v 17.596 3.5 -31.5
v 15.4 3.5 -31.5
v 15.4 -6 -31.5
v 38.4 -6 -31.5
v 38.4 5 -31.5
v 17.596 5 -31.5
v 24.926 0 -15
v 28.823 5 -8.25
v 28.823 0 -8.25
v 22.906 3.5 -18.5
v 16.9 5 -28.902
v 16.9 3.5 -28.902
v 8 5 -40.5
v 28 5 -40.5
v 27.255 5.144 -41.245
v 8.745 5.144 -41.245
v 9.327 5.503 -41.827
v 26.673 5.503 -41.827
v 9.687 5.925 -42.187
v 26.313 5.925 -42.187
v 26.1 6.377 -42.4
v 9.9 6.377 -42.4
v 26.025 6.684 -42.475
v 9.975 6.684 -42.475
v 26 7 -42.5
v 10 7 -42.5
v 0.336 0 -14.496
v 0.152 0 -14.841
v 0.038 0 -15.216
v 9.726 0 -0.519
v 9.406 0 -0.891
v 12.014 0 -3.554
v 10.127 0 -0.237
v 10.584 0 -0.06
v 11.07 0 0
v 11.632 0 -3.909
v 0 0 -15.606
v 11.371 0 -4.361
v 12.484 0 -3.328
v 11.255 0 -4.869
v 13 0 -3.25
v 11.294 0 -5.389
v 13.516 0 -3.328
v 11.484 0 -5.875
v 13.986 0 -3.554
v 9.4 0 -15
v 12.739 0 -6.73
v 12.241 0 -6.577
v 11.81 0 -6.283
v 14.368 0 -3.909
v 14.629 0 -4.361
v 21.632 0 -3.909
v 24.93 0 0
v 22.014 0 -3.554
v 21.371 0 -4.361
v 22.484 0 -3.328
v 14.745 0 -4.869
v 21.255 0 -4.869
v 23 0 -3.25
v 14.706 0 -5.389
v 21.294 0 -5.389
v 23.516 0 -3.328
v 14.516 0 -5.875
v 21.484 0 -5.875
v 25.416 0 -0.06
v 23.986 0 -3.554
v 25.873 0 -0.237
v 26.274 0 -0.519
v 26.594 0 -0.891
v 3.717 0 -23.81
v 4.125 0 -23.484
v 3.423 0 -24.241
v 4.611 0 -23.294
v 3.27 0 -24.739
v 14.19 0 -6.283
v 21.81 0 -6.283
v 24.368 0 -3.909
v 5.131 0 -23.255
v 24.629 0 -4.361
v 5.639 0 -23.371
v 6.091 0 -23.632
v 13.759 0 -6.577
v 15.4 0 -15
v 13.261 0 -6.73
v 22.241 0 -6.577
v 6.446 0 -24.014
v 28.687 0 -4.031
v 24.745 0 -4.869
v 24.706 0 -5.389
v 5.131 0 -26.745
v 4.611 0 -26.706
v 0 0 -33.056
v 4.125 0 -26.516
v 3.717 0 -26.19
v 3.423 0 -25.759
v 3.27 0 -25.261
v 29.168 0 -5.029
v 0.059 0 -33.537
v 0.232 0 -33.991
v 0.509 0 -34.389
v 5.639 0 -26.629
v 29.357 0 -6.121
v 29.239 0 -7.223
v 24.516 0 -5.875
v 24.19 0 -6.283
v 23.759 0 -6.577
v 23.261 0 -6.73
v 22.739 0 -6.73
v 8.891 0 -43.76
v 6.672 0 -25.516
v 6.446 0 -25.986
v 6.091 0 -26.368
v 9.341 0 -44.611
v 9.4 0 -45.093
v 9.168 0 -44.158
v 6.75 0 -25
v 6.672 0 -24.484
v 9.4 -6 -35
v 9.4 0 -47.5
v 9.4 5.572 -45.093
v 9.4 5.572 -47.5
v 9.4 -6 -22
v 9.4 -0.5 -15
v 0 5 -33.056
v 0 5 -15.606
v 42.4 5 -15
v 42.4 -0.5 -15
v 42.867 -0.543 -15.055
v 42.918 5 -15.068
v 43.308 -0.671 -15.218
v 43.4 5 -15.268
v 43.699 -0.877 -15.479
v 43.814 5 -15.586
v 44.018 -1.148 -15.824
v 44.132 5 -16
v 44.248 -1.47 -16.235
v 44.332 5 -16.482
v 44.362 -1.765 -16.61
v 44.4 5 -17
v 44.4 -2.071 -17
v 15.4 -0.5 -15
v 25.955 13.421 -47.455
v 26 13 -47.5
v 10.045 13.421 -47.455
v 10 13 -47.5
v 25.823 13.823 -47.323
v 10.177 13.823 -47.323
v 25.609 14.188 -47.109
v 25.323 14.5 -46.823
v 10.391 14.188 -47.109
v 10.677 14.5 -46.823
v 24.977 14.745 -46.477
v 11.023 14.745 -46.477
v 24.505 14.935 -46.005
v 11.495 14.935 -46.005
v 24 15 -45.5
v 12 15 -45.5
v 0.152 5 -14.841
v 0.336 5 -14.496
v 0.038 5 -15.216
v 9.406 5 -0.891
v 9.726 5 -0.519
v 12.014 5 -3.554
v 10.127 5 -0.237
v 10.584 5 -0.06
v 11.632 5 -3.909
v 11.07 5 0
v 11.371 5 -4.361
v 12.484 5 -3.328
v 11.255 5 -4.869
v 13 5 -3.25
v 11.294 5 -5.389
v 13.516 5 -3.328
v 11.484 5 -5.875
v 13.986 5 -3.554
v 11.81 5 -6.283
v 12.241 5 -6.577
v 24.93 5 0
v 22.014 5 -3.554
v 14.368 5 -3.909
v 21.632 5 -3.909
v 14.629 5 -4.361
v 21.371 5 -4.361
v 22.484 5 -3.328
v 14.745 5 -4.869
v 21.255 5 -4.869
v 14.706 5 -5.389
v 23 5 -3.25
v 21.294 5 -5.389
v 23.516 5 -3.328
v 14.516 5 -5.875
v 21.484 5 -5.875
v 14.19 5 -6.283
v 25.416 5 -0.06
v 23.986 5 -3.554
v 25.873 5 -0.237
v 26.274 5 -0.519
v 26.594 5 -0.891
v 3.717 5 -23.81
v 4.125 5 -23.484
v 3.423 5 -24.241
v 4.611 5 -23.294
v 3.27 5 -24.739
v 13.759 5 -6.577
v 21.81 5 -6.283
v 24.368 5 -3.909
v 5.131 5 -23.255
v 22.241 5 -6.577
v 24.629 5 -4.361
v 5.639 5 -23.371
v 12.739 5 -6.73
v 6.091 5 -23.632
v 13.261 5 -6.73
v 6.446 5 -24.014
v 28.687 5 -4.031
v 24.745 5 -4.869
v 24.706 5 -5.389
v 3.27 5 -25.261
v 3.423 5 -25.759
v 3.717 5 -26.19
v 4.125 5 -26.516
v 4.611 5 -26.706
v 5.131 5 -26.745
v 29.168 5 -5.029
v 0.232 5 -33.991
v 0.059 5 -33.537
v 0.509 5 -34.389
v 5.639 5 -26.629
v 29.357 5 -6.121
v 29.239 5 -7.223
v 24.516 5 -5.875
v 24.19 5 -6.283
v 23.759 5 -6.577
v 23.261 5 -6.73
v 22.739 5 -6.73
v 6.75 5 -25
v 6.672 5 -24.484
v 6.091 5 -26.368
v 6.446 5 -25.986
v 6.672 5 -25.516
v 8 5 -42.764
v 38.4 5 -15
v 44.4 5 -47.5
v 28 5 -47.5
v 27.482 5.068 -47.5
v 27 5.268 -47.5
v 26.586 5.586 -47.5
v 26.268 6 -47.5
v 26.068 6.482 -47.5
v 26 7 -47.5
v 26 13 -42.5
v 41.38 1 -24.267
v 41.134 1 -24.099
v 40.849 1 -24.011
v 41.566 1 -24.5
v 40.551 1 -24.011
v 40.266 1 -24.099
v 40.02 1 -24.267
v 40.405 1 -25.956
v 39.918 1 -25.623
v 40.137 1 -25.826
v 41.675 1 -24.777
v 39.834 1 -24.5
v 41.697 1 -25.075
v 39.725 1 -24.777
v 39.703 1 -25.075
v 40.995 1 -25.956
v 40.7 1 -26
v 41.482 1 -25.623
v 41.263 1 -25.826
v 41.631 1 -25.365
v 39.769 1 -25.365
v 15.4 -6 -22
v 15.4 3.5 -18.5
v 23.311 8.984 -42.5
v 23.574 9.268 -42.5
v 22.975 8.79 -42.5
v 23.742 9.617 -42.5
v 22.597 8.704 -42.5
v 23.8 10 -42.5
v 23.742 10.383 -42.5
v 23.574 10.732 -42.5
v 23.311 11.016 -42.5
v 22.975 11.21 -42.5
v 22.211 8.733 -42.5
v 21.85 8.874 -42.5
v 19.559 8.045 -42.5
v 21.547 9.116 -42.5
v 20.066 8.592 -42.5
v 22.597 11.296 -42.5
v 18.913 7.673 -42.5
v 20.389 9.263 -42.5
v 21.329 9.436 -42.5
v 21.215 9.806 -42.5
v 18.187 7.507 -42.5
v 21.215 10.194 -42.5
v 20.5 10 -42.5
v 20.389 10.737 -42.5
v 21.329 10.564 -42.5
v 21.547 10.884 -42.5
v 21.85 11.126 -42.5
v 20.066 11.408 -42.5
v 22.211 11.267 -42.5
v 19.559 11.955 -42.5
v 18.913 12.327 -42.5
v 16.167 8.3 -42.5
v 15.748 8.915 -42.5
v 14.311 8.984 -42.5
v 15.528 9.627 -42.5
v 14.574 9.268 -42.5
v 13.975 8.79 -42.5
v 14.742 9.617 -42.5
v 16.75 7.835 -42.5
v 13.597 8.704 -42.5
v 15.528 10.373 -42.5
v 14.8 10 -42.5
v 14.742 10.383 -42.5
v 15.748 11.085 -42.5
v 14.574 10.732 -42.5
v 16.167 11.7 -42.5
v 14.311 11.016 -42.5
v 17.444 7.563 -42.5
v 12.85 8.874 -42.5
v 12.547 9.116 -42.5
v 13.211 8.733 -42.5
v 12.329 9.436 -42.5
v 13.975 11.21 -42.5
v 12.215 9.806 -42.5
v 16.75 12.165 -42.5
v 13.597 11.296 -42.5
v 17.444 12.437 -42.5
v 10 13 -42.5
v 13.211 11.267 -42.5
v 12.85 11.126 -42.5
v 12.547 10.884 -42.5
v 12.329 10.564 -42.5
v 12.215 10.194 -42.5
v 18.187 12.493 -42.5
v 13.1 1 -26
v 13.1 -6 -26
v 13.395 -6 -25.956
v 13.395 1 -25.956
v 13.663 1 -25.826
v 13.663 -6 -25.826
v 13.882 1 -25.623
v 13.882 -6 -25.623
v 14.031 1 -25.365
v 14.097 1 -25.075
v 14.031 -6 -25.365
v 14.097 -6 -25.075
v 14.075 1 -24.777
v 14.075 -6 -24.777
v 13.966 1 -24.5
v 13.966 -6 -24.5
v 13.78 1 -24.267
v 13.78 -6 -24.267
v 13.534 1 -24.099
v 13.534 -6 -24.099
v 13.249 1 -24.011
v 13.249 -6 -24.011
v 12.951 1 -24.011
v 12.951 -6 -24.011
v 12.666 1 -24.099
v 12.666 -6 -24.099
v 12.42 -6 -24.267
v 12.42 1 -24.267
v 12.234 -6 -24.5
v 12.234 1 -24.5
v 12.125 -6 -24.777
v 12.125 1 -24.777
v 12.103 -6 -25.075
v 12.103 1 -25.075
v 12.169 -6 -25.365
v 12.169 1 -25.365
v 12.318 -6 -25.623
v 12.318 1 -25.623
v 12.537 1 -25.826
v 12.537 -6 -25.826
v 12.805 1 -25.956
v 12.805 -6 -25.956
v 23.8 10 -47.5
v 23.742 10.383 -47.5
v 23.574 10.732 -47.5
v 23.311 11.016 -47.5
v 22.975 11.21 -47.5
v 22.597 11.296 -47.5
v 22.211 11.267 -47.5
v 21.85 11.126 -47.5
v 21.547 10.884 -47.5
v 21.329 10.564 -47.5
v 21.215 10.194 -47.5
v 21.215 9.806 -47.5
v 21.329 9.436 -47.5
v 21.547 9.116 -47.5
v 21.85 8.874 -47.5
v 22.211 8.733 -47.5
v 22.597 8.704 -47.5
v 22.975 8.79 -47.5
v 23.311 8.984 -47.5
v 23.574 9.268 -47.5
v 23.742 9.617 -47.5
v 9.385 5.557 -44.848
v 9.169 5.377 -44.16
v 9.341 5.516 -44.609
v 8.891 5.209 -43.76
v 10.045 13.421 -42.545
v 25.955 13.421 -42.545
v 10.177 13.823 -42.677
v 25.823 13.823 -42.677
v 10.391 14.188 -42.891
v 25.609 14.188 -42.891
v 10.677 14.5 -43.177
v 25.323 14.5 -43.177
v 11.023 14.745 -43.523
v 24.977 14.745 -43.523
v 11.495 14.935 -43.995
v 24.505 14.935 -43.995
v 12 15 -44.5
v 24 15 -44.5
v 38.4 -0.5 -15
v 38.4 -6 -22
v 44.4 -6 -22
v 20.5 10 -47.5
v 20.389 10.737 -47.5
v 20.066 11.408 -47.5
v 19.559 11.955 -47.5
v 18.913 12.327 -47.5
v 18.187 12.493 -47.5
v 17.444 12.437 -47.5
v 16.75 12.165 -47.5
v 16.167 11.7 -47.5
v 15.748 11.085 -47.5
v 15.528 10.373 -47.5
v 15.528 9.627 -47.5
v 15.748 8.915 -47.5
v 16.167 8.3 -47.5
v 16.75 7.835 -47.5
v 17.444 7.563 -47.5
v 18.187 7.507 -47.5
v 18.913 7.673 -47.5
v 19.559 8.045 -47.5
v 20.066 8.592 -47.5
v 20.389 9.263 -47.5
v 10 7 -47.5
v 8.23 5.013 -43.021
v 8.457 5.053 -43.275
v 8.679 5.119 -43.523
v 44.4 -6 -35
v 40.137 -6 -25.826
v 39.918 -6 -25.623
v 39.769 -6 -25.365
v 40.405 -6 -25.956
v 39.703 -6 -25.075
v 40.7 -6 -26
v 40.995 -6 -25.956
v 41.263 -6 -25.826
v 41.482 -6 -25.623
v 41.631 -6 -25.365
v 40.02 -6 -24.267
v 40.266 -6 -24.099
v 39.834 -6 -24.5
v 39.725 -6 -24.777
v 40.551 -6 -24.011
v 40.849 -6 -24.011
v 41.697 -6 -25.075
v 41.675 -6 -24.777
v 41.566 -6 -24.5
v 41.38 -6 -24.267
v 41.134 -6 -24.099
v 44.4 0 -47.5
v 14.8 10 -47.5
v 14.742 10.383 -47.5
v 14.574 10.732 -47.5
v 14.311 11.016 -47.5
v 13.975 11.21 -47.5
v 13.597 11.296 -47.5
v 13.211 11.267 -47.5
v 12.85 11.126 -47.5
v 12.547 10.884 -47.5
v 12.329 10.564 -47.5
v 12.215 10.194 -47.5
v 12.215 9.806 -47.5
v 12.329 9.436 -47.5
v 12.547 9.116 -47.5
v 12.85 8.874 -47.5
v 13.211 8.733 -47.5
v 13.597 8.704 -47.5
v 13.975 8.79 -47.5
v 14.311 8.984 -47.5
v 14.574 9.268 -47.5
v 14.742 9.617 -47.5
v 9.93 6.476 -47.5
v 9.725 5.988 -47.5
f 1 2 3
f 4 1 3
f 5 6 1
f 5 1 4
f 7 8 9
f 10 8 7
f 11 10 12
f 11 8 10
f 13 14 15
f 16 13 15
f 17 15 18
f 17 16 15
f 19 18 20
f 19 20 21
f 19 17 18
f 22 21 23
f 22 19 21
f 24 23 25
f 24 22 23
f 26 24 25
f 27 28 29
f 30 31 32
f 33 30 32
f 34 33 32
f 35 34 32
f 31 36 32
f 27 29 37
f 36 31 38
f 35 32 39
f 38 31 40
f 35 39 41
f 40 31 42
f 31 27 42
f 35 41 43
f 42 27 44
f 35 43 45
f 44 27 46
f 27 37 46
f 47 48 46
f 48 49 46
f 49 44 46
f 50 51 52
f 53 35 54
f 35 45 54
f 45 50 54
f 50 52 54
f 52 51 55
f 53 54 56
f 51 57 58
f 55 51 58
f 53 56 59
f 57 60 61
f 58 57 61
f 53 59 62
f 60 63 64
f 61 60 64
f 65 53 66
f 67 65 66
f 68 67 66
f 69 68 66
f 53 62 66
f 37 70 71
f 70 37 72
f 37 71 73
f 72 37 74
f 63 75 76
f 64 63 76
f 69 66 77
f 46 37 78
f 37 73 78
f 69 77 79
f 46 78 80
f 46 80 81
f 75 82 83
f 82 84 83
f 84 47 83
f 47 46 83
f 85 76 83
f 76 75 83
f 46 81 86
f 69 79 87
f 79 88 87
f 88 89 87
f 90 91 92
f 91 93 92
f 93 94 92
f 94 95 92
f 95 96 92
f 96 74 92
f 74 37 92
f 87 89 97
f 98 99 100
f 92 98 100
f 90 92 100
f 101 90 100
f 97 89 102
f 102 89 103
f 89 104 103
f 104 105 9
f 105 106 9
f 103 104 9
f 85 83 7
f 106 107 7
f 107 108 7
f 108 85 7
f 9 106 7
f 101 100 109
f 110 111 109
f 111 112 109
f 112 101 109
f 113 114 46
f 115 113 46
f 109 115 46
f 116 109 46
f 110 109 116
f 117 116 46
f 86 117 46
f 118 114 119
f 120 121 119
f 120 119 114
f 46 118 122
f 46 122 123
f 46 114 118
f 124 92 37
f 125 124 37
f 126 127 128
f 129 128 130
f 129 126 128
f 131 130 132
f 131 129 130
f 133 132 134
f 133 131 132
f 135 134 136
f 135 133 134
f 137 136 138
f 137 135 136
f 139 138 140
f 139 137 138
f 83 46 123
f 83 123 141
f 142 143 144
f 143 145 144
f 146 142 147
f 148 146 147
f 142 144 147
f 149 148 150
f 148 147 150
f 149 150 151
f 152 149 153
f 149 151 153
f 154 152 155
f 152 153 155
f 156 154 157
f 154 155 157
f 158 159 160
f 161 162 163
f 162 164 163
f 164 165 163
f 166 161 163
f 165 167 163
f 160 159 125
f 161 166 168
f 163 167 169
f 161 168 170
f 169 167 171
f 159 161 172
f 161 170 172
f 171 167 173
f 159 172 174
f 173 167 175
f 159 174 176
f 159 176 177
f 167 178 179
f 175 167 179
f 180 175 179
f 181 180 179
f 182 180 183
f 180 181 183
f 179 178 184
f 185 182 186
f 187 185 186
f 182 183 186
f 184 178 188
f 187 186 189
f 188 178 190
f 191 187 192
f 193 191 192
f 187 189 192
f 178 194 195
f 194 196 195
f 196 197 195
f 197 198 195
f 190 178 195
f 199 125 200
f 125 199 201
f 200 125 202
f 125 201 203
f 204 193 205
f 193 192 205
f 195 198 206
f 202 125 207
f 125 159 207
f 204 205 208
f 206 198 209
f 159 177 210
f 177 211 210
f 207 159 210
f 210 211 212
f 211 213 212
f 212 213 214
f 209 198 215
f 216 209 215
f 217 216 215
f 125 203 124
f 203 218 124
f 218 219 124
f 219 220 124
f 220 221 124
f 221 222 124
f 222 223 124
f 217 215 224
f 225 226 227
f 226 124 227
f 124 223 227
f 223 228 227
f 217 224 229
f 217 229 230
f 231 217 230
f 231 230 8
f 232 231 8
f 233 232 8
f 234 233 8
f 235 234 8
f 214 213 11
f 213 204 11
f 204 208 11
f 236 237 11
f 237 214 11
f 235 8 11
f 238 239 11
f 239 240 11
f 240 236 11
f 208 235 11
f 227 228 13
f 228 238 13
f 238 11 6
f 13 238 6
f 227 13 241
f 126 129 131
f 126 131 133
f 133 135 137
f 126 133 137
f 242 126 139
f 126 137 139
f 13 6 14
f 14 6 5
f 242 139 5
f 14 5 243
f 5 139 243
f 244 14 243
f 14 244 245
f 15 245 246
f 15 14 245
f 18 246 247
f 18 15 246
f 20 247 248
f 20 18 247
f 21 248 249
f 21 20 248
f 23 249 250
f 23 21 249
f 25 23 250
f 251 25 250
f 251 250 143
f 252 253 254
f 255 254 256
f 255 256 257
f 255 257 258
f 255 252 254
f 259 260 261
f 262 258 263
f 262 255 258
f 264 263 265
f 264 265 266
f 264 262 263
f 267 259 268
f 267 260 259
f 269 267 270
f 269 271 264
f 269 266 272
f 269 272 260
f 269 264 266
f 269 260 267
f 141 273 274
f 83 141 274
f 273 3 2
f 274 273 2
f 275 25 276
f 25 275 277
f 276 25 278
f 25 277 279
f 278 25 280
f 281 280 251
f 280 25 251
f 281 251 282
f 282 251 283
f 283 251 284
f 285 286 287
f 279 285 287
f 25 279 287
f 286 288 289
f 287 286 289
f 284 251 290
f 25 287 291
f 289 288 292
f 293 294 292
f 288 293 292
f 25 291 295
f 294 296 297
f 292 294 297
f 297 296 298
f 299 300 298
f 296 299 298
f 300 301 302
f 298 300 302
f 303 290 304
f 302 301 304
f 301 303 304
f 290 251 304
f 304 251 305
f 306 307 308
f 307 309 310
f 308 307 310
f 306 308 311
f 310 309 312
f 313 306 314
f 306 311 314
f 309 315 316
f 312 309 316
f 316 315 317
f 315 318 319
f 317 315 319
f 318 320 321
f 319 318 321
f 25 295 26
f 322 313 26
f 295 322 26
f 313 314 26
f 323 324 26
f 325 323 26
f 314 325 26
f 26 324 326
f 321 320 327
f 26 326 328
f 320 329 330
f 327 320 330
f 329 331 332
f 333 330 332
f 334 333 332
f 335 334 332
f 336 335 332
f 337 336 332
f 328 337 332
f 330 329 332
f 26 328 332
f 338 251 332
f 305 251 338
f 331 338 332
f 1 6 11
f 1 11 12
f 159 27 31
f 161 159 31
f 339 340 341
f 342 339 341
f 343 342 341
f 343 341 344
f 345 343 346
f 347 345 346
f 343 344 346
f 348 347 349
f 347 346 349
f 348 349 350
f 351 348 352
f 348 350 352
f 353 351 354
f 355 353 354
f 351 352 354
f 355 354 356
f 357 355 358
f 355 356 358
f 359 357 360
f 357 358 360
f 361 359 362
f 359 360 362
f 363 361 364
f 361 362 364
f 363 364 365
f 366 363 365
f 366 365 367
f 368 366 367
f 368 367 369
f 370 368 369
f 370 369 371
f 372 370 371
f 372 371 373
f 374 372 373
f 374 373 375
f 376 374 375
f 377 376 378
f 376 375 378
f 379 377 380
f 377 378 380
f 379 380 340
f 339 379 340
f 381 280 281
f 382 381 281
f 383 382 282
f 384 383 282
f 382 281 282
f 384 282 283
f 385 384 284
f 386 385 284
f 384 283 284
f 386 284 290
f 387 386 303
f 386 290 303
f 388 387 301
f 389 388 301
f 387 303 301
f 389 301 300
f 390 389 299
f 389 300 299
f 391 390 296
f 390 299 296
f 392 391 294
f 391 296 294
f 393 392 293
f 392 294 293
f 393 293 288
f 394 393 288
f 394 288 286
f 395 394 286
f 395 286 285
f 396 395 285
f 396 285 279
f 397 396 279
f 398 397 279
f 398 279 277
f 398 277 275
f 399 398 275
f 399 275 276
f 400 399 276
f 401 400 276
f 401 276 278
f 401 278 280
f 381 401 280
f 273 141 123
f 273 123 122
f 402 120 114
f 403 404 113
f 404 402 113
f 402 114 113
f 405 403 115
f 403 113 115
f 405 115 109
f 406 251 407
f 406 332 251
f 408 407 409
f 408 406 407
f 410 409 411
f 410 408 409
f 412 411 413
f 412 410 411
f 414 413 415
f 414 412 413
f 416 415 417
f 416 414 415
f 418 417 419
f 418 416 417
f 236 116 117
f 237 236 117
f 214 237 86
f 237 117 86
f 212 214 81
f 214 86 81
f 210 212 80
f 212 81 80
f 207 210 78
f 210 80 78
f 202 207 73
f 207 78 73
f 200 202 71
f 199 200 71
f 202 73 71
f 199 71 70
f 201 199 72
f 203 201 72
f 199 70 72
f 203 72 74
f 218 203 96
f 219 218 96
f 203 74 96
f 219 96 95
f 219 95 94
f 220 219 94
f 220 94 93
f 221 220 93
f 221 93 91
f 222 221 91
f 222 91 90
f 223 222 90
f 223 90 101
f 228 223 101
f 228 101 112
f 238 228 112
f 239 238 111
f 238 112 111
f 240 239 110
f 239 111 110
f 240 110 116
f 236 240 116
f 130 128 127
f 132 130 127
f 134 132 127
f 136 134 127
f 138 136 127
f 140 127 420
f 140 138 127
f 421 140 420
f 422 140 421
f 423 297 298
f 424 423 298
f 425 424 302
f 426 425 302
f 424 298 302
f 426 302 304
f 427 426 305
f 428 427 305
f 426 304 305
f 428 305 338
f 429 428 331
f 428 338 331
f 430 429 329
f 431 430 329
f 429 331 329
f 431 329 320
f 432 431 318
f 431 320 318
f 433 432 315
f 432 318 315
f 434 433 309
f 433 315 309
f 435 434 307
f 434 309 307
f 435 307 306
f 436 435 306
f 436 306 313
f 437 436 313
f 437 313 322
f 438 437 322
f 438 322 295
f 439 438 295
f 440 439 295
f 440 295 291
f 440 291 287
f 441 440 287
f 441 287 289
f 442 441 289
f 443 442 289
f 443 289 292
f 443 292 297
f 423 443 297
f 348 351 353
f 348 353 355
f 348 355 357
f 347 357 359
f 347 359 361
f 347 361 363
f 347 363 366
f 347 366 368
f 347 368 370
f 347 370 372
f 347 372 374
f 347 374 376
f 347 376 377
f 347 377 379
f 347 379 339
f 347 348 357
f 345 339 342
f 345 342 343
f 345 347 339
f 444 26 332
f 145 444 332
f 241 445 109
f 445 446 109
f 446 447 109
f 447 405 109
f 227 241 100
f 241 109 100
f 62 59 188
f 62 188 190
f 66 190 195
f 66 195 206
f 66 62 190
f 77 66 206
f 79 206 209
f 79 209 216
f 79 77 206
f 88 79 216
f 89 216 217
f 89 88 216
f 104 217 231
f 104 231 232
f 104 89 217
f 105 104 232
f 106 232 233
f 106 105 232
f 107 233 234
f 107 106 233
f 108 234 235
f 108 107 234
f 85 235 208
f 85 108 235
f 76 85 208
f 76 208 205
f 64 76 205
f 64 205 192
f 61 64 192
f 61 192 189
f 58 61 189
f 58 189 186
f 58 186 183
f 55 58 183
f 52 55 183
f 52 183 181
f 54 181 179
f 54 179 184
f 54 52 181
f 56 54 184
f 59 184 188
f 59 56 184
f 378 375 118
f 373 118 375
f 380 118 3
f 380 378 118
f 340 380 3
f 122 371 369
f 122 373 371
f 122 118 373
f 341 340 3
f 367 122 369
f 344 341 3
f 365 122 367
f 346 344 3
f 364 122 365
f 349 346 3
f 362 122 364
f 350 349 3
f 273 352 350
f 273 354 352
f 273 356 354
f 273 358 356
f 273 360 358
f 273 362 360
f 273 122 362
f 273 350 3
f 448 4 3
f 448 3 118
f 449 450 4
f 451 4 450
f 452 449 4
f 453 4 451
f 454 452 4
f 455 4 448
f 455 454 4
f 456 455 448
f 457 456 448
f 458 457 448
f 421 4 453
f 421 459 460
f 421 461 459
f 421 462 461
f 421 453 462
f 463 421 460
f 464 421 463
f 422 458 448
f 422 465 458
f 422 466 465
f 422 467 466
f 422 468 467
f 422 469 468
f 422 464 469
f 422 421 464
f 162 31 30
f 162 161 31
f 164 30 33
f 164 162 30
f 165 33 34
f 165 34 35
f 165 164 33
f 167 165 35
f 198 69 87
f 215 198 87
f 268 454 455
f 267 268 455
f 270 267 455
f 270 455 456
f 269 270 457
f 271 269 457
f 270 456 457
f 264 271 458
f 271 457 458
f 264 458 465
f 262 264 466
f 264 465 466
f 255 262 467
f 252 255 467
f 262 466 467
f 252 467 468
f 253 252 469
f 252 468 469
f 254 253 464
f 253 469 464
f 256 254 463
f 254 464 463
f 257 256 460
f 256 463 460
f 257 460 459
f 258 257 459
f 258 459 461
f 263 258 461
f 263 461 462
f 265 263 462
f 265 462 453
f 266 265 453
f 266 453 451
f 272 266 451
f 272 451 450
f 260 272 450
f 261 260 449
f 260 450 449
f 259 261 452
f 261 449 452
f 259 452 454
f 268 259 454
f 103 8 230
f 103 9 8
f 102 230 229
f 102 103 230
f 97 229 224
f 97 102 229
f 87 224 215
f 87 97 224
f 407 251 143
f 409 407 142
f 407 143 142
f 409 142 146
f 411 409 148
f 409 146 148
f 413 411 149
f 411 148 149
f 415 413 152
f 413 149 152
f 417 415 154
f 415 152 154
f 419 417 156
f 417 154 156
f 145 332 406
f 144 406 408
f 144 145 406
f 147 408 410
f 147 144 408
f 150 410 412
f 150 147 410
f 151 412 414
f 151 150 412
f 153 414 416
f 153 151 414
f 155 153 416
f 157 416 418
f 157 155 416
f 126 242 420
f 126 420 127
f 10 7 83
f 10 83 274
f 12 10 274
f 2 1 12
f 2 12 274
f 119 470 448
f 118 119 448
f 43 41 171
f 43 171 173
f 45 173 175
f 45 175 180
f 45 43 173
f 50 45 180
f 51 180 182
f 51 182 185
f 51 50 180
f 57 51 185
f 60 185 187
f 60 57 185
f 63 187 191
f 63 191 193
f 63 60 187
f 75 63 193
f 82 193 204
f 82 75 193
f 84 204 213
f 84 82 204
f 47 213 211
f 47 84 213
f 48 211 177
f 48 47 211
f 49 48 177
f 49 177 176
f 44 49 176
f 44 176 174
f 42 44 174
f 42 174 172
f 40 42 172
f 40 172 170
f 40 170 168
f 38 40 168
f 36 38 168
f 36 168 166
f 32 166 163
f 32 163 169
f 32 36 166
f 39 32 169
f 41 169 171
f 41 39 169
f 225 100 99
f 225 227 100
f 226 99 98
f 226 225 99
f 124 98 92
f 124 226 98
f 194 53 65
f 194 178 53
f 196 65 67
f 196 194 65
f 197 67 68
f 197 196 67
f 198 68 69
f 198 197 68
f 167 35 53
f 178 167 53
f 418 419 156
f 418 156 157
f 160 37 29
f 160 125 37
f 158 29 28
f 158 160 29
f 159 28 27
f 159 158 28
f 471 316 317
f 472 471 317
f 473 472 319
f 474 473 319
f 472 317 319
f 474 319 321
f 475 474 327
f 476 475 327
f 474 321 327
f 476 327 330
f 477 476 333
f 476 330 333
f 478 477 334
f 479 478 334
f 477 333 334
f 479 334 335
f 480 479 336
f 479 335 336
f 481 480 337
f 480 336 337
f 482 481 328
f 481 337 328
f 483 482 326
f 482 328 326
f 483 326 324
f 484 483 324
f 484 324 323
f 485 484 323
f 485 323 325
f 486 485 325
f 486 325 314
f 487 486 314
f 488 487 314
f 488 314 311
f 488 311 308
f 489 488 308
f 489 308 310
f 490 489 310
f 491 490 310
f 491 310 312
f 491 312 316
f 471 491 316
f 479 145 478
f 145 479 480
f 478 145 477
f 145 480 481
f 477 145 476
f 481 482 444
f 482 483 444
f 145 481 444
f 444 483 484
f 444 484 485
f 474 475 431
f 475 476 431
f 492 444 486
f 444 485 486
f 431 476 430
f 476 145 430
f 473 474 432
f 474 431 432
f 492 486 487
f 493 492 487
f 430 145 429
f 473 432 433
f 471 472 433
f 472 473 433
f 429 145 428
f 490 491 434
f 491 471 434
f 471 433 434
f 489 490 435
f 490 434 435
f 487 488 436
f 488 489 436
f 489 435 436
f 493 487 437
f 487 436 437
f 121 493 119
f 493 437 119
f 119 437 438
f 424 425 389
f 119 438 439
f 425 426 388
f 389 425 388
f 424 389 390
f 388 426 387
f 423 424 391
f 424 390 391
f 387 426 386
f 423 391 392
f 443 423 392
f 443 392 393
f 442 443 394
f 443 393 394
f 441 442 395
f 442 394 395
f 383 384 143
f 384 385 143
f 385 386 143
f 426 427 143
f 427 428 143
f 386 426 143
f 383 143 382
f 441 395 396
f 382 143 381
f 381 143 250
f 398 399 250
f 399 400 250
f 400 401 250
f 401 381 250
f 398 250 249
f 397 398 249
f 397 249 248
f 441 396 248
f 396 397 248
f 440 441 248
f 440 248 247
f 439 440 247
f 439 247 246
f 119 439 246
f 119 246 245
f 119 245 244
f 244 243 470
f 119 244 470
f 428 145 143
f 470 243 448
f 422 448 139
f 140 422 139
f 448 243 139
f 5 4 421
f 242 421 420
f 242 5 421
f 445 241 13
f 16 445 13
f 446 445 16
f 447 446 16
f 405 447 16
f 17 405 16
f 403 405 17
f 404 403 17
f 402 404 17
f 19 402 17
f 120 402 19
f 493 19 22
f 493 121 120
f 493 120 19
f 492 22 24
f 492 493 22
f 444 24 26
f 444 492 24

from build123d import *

# Parameters (mm, degrees)
SKETCH1_R                = 1.75
SKETCH1_W                = 7.2
SKETCH1_H                = 5.4
BOSS_EXTRUDE1_DEPTH      = 5
FILLET5_RADIUS           = 10
FILLET5_LENGTH           = 5
FILLET2_R                = 5.4
FILLET6_R                = 5.4
SKETCH3_W                = 35
SKETCH3_H                = 20
SKETCH3_W_2              = 23
SKETCH3_H_2              = 13
BOSS_EXTRUDE4_DEPTH      = 6
SKETCH5_W                = 23
SKETCH5_H                = 13
CUT_EXTRUDE1_DEPTH       = 3.5
CUT_EXTRUDE2_DEPTH       = 76.239617224
SKETCH9_R                = 1
CUT_EXTRUDE4_DEPTH       = 7
BOSS_EXTRUDE5_DEPTH      = 2.5
BOSS_EXTRUDE5_DEPTH_BACK = 2.5
SKETCH10_W               = 16
SKETCH10_H               = 15
SKETCH11_R               = 2.5
SKETCH11_R_2             = 1.3
CUT_EXTRUDE5_DEPTH       = 64.2661837
FILLET8_R                = 2
BOSS_EXTRUDE10_DEPTH     = 35
SKETCH13_W               = 23
SKETCH13_H               = 9.5
CUT_EXTRUDE6_DEPTH       = 3.5
CUT_EXTRUDE7_REACH       = 68.728
BOSS_EXTRUDE11_DEPTH     = 20.6
FILLET9_R                = 2
FILLET10_R               = 2
CUT_EXTRUDE9_DEPTH       = 67.029236021
CUT_EXTRUDE9_DEPTH_BACK  = 67.029236021
FILLET11_R               = 4
CHAMFER1_SIZE            = 3
CHAMFER1_SIZE2           = 2.196152423


# Read off the part's stored shape, not the designer's step: Boss-Extrude11
with BuildPart() as part:
    # Sketch1 → Boss-Extrude1 (new body)
    # profile 1 of 4: a face of its own
    with BuildSketch(Plane(origin=(0, 0, 0), x_dir=(1, 0, 0), z_dir=(0, 1, 0))):
        with BuildLine():
            Line((3.25, 25), (0, 25))
            Line((0, 25), (0, 15))
            Line((0, 15), (10, 0))
            Line((10, 0), (26, 0))
            Line((26, 0), (36, 15))
            Line((36, 15), (60, 15))
            Line((60, 15), (60, 25))
            Line((60, 25), (44.5, 25))
            Line((44.5, 25), (44.5, 19.6))
            Line((44.5, 19.6), (37.3, 19.6))
            Line((37.3, 19.6), (26.5, 19.6))
            Line((26.5, 19.6), (26.5, 25))
            Line((26.5, 25), (6.75, 25))
            ThreePointArc((6.75, 25), (5, 23.25), (3.25, 25))
        make_face()
        with Locations(Location((13, 5, 0), (0, 0, 270))):
            Circle(SKETCH1_R, mode=Mode.SUBTRACT)
        with Locations(Location((23, 5, 0), (0, 0, 270))):
            Circle(SKETCH1_R, mode=Mode.SUBTRACT)
    # profile 2 of 4: a face of its own
    with BuildSketch(Plane(origin=(0, 0, 0), x_dir=(1, 0, 0), z_dir=(0, 1, 0))):
        with BuildLine():
            Line((10, 45), (0, 33.819660113))
            Line((0, 33.819660113), (0, 25))
            Line((0, 25), (3.25, 25))
            ThreePointArc((3.25, 25), (5, 26.75), (6.75, 25))
            Line((6.75, 25), (26.5, 25))
            Line((26.5, 25), (26.5, 30.4))
            Line((26.5, 30.4), (37.3, 30.4))
            Line((37.3, 30.4), (44.5, 30.4))
            Line((44.5, 30.4), (44.5, 25))
            Line((44.5, 25), (60, 25))
            Line((60, 25), (60, 35))
            Line((60, 35), (36, 35))
            Line((36, 35), (26, 45))
            Line((26, 45), (10, 45))
        make_face()
    # profile 3 of 4: a face of its own
    with BuildSketch(Plane(origin=(0, 0, 0), x_dir=(1, 0, 0), z_dir=(0, 1, 0))):
        with Locations((40.9, 27.7)):
            Rectangle(SKETCH1_W, SKETCH1_H)
    # profile 4 of 4: a face of its own
    with BuildSketch(Plane(origin=(0, 0, 0), x_dir=(1, 0, 0), z_dir=(0, 1, 0))):
        with Locations((40.9, 22.3)):
            Rectangle(SKETCH1_W, SKETCH1_H)
    extrude(amount=BOSS_EXTRUDE1_DEPTH)

    # Fillet5: full round fillet: the end face becomes a half cylinder, R = half its width
    fillet5_face = Plane((60, 2.5, -25), x_dir=(0, -1, 0), z_dir=(1, 0, 0))  # on the end face: x along it, z out of the body
    fillet5_slab = fillet5_face.offset(-FILLET5_RADIUS / 2) * Box(FILLET5_LENGTH, 2 * FILLET5_RADIUS, FILLET5_RADIUS, mode=Mode.PRIVATE)  # the body's end, R deep
    fillet5_round = Plane((50, 2.5, -25), x_dir=(1, 0, 0), z_dir=(0, -1, 0)) * Cylinder(FILLET5_RADIUS, FILLET5_LENGTH, mode=Mode.PRIVATE)  # its axis R under the face
    add(fillet5_slab - fillet5_round, mode=Mode.SUBTRACT)

    # Fillet2
    fillet2_edges = [part.edges().sort_by_distance(p)[0] for p in [
        (26.5, 2.5, -30.4),
        (26.5, 2.5, -19.6),
    ]]
    fillet(fillet2_edges, radius=FILLET2_R - 0.0001)  # a hair under: the kernel refuses the full size

    # Fillet6
    fillet6_edges = [part.edges().sort_by_distance(p)[0] for p in [
        (37.3, 2.5, -19.6),
        (37.3, 2.5, -30.4),
    ]]
    fillet(fillet6_edges, radius=FILLET6_R - 0.0001)  # a hair under: the kernel refuses the full size

    # Sketch3 → Boss-Extrude4 (add)
    with BuildSketch(Plane.XZ):
        with Locations((26.9, -25)):
            Rectangle(SKETCH3_W, SKETCH3_H)
        with Locations((26.9, -25)):
            Rectangle(SKETCH3_W_2, SKETCH3_H_2, mode=Mode.SUBTRACT)
    extrude(amount=BOSS_EXTRUDE4_DEPTH)

    # Sketch5 → Cut-Extrude1 (cut)
    with BuildSketch(Plane.XZ):
        with Locations((26.9, -25)):
            Rectangle(SKETCH5_W, SKETCH5_H)
    extrude(amount=-CUT_EXTRUDE1_DEPTH, mode=Mode.SUBTRACT)

    # Sketch6 → Cut-Extrude2 (cut, through all)
    with BuildSketch(Plane.XZ):
        with BuildLine():
            Line((44.4, -15), (44.4, -35))
            Line((44.4, -35), (50, -35))
            ThreePointArc((50, -35), (60, -25), (50, -15))
            Line((50, -15), (44.4, -15))
        make_face()
    extrude(amount=-CUT_EXTRUDE2_DEPTH, mode=Mode.SUBTRACT)

    # Sketch9 → Cut-Extrude4 (cut)
    with BuildSketch(Plane.XZ.offset(6)):
        with Locations(Location((13.1, -25, 0), (0, 0, 270))):
            Circle(SKETCH9_R)
        with Locations(Location((40.7, -25, 0), (0, 0, 270))):
            Circle(SKETCH9_R)
    extrude(amount=-CUT_EXTRUDE4_DEPTH, mode=Mode.SUBTRACT)

    # Sketch10 → Boss-Extrude5 (add, two sides: drawn at the far end of the back side and taken through both)
    with BuildSketch(Plane(origin=(0, 0, -45), x_dir=(-1, 0, 0), z_dir=(0, 0, -1)).offset(-BOSS_EXTRUDE5_DEPTH_BACK)):
        with Locations((-18, 7.5)):
            Rectangle(SKETCH10_W, SKETCH10_H)
    extrude(amount=BOSS_EXTRUDE5_DEPTH + BOSS_EXTRUDE5_DEPTH_BACK)

    # Sketch11 → Cut-Extrude5 (cut, through all)
    with BuildSketch(Plane.XY.offset(-42.5)):
        with Locations((18, 10)):
            Circle(SKETCH11_R)
        with Locations((22.5, 10)):
            Circle(SKETCH11_R_2)
        with Locations((13.5, 10)):
            Circle(SKETCH11_R_2)
    extrude(amount=-CUT_EXTRUDE5_DEPTH, mode=Mode.SUBTRACT)

    # Fillet8
    fillet8_edges = [part.edges().sort_by_distance(p)[0] for p in [
        (26, 15, -45),
        (18, 15, -42.5),
        (10, 15, -45),
        (18, 15, -47.5),
    ]]
    fillet(fillet8_edges, radius=FILLET8_R)

    # Sketch12 → Boss-Extrude10 (add)
    with BuildSketch(Plane(origin=(44.4, 0, 0), x_dir=(0, 0, -1), z_dir=(1, 0, 0))):
        Polygon((35, -6), (35, 5), (47.5, 5), (47.5, 0), align=None)
    extrude(amount=-BOSS_EXTRUDE10_DEPTH)

    # Sketch13 → Cut-Extrude6 (cut)
    with BuildSketch(Plane(origin=(0, 0, -18.5), x_dir=(-1, 0, 0), z_dir=(0, 0, -1))):
        with Locations((-26.9, -1.25)):
            Rectangle(SKETCH13_W, SKETCH13_H)
    extrude(amount=-CUT_EXTRUDE6_DEPTH, mode=Mode.SUBTRACT)

    # Cut-Extrude7: up to this face of the body (flat: up to its plane)
    cut_extrude7_end = Plane(part.part.faces().sort_by_distance((9.4, -2.280677184, -29.977280777))[0])
    # Sketch14 → Cut-Extrude7 (cut, up to the picked face)
    with BuildSketch(Plane(origin=(44.4, 0, 0), x_dir=(0, 0, -1), z_dir=(1, 0, 0)), mode=Mode.PRIVATE) as cut_extrude7_sk1:
        Polygon((15, -0.5), (22, -6), (15, -6), align=None)
    cut_extrude7_tool1 = split(extrude(cut_extrude7_sk1.sketch, amount=-CUT_EXTRUDE7_REACH, mode=Mode.PRIVATE), bisect_by=cut_extrude7_end, keep=Keep.BOTH, mode=Mode.PRIVATE)
    add(cut_extrude7_tool1.solids().sort_by(Axis((44.4, -4.166667, -17.333333), (-1, 0, 0)))[0], mode=Mode.SUBTRACT)

    # Boss-Extrude11 outline → Boss-Extrude11 (add)
    with BuildSketch(Plane(origin=(15.4, 0, 0), x_dir=(0, 0, -1), z_dir=(1, 0, 0))):
        Polygon((15, 0), (18.5, 3.5), (15, 3.5), align=None)
    extrude(amount=BOSS_EXTRUDE11_DEPTH)

    # Fillet9
    fillet9_edges = [part.edges().sort_by_distance(p)[0] for p in [
        (9.4, 2.5, -44.329179607),
        (44.4, 2.25, -15),
        (36, 4.25, -15),
        (26, 2.5, 0),
        (10, 2.5, 0),
        (0, 2.5, -15),
        (0, 2.5, -33.819660113),
    ]]
    fillet(fillet9_edges, radius=FILLET9_R)

    # Fillet10
    fillet10_edges = [part.edges().sort_by_distance(p)[0] for p in [
        (10, 5, -45),
        (26, 5, -45),
        (18, 5, -42.5),
    ]]
    fillet(fillet10_edges, radius=FILLET10_R)

    # Sketch18 → Cut-Extrude9 (cut, two sides: drawn at the far end of the back side and taken through both)
    with BuildSketch(Plane.XZ.offset(-3.5).offset(-CUT_EXTRUDE9_DEPTH_BACK)):
        Polygon((15.4, -31.5), (38.4, -31.5), (38.4, 8.337168574), align=None)
    extrude(amount=CUT_EXTRUDE9_DEPTH + CUT_EXTRUDE9_DEPTH_BACK, mode=Mode.SUBTRACT)

    # Fillet11
    fillet11_edges = [part.edges().sort_by_distance(p)[0] for p in [
        (30.065611038, 2.5, -6.098416558),
    ]]
    fillet(fillet11_edges, radius=FILLET11_R)

    # Chamfer1
    chamfer1_edges = [part.edges().sort_by_distance(p)[0] for p in [
        (15.4, 4.25, -31.5),
    ]]
    chamfer1_side = [part.faces().sort_by_distance(p)[0] for p in [
        (24.055872114, 3.154417612, -16.507589715),
    ]]
    chamfer(chamfer1_edges, length=CHAMFER1_SIZE, length2=CHAMFER1_SIZE2, reference=chamfer1_side[0])


solid = part.part
